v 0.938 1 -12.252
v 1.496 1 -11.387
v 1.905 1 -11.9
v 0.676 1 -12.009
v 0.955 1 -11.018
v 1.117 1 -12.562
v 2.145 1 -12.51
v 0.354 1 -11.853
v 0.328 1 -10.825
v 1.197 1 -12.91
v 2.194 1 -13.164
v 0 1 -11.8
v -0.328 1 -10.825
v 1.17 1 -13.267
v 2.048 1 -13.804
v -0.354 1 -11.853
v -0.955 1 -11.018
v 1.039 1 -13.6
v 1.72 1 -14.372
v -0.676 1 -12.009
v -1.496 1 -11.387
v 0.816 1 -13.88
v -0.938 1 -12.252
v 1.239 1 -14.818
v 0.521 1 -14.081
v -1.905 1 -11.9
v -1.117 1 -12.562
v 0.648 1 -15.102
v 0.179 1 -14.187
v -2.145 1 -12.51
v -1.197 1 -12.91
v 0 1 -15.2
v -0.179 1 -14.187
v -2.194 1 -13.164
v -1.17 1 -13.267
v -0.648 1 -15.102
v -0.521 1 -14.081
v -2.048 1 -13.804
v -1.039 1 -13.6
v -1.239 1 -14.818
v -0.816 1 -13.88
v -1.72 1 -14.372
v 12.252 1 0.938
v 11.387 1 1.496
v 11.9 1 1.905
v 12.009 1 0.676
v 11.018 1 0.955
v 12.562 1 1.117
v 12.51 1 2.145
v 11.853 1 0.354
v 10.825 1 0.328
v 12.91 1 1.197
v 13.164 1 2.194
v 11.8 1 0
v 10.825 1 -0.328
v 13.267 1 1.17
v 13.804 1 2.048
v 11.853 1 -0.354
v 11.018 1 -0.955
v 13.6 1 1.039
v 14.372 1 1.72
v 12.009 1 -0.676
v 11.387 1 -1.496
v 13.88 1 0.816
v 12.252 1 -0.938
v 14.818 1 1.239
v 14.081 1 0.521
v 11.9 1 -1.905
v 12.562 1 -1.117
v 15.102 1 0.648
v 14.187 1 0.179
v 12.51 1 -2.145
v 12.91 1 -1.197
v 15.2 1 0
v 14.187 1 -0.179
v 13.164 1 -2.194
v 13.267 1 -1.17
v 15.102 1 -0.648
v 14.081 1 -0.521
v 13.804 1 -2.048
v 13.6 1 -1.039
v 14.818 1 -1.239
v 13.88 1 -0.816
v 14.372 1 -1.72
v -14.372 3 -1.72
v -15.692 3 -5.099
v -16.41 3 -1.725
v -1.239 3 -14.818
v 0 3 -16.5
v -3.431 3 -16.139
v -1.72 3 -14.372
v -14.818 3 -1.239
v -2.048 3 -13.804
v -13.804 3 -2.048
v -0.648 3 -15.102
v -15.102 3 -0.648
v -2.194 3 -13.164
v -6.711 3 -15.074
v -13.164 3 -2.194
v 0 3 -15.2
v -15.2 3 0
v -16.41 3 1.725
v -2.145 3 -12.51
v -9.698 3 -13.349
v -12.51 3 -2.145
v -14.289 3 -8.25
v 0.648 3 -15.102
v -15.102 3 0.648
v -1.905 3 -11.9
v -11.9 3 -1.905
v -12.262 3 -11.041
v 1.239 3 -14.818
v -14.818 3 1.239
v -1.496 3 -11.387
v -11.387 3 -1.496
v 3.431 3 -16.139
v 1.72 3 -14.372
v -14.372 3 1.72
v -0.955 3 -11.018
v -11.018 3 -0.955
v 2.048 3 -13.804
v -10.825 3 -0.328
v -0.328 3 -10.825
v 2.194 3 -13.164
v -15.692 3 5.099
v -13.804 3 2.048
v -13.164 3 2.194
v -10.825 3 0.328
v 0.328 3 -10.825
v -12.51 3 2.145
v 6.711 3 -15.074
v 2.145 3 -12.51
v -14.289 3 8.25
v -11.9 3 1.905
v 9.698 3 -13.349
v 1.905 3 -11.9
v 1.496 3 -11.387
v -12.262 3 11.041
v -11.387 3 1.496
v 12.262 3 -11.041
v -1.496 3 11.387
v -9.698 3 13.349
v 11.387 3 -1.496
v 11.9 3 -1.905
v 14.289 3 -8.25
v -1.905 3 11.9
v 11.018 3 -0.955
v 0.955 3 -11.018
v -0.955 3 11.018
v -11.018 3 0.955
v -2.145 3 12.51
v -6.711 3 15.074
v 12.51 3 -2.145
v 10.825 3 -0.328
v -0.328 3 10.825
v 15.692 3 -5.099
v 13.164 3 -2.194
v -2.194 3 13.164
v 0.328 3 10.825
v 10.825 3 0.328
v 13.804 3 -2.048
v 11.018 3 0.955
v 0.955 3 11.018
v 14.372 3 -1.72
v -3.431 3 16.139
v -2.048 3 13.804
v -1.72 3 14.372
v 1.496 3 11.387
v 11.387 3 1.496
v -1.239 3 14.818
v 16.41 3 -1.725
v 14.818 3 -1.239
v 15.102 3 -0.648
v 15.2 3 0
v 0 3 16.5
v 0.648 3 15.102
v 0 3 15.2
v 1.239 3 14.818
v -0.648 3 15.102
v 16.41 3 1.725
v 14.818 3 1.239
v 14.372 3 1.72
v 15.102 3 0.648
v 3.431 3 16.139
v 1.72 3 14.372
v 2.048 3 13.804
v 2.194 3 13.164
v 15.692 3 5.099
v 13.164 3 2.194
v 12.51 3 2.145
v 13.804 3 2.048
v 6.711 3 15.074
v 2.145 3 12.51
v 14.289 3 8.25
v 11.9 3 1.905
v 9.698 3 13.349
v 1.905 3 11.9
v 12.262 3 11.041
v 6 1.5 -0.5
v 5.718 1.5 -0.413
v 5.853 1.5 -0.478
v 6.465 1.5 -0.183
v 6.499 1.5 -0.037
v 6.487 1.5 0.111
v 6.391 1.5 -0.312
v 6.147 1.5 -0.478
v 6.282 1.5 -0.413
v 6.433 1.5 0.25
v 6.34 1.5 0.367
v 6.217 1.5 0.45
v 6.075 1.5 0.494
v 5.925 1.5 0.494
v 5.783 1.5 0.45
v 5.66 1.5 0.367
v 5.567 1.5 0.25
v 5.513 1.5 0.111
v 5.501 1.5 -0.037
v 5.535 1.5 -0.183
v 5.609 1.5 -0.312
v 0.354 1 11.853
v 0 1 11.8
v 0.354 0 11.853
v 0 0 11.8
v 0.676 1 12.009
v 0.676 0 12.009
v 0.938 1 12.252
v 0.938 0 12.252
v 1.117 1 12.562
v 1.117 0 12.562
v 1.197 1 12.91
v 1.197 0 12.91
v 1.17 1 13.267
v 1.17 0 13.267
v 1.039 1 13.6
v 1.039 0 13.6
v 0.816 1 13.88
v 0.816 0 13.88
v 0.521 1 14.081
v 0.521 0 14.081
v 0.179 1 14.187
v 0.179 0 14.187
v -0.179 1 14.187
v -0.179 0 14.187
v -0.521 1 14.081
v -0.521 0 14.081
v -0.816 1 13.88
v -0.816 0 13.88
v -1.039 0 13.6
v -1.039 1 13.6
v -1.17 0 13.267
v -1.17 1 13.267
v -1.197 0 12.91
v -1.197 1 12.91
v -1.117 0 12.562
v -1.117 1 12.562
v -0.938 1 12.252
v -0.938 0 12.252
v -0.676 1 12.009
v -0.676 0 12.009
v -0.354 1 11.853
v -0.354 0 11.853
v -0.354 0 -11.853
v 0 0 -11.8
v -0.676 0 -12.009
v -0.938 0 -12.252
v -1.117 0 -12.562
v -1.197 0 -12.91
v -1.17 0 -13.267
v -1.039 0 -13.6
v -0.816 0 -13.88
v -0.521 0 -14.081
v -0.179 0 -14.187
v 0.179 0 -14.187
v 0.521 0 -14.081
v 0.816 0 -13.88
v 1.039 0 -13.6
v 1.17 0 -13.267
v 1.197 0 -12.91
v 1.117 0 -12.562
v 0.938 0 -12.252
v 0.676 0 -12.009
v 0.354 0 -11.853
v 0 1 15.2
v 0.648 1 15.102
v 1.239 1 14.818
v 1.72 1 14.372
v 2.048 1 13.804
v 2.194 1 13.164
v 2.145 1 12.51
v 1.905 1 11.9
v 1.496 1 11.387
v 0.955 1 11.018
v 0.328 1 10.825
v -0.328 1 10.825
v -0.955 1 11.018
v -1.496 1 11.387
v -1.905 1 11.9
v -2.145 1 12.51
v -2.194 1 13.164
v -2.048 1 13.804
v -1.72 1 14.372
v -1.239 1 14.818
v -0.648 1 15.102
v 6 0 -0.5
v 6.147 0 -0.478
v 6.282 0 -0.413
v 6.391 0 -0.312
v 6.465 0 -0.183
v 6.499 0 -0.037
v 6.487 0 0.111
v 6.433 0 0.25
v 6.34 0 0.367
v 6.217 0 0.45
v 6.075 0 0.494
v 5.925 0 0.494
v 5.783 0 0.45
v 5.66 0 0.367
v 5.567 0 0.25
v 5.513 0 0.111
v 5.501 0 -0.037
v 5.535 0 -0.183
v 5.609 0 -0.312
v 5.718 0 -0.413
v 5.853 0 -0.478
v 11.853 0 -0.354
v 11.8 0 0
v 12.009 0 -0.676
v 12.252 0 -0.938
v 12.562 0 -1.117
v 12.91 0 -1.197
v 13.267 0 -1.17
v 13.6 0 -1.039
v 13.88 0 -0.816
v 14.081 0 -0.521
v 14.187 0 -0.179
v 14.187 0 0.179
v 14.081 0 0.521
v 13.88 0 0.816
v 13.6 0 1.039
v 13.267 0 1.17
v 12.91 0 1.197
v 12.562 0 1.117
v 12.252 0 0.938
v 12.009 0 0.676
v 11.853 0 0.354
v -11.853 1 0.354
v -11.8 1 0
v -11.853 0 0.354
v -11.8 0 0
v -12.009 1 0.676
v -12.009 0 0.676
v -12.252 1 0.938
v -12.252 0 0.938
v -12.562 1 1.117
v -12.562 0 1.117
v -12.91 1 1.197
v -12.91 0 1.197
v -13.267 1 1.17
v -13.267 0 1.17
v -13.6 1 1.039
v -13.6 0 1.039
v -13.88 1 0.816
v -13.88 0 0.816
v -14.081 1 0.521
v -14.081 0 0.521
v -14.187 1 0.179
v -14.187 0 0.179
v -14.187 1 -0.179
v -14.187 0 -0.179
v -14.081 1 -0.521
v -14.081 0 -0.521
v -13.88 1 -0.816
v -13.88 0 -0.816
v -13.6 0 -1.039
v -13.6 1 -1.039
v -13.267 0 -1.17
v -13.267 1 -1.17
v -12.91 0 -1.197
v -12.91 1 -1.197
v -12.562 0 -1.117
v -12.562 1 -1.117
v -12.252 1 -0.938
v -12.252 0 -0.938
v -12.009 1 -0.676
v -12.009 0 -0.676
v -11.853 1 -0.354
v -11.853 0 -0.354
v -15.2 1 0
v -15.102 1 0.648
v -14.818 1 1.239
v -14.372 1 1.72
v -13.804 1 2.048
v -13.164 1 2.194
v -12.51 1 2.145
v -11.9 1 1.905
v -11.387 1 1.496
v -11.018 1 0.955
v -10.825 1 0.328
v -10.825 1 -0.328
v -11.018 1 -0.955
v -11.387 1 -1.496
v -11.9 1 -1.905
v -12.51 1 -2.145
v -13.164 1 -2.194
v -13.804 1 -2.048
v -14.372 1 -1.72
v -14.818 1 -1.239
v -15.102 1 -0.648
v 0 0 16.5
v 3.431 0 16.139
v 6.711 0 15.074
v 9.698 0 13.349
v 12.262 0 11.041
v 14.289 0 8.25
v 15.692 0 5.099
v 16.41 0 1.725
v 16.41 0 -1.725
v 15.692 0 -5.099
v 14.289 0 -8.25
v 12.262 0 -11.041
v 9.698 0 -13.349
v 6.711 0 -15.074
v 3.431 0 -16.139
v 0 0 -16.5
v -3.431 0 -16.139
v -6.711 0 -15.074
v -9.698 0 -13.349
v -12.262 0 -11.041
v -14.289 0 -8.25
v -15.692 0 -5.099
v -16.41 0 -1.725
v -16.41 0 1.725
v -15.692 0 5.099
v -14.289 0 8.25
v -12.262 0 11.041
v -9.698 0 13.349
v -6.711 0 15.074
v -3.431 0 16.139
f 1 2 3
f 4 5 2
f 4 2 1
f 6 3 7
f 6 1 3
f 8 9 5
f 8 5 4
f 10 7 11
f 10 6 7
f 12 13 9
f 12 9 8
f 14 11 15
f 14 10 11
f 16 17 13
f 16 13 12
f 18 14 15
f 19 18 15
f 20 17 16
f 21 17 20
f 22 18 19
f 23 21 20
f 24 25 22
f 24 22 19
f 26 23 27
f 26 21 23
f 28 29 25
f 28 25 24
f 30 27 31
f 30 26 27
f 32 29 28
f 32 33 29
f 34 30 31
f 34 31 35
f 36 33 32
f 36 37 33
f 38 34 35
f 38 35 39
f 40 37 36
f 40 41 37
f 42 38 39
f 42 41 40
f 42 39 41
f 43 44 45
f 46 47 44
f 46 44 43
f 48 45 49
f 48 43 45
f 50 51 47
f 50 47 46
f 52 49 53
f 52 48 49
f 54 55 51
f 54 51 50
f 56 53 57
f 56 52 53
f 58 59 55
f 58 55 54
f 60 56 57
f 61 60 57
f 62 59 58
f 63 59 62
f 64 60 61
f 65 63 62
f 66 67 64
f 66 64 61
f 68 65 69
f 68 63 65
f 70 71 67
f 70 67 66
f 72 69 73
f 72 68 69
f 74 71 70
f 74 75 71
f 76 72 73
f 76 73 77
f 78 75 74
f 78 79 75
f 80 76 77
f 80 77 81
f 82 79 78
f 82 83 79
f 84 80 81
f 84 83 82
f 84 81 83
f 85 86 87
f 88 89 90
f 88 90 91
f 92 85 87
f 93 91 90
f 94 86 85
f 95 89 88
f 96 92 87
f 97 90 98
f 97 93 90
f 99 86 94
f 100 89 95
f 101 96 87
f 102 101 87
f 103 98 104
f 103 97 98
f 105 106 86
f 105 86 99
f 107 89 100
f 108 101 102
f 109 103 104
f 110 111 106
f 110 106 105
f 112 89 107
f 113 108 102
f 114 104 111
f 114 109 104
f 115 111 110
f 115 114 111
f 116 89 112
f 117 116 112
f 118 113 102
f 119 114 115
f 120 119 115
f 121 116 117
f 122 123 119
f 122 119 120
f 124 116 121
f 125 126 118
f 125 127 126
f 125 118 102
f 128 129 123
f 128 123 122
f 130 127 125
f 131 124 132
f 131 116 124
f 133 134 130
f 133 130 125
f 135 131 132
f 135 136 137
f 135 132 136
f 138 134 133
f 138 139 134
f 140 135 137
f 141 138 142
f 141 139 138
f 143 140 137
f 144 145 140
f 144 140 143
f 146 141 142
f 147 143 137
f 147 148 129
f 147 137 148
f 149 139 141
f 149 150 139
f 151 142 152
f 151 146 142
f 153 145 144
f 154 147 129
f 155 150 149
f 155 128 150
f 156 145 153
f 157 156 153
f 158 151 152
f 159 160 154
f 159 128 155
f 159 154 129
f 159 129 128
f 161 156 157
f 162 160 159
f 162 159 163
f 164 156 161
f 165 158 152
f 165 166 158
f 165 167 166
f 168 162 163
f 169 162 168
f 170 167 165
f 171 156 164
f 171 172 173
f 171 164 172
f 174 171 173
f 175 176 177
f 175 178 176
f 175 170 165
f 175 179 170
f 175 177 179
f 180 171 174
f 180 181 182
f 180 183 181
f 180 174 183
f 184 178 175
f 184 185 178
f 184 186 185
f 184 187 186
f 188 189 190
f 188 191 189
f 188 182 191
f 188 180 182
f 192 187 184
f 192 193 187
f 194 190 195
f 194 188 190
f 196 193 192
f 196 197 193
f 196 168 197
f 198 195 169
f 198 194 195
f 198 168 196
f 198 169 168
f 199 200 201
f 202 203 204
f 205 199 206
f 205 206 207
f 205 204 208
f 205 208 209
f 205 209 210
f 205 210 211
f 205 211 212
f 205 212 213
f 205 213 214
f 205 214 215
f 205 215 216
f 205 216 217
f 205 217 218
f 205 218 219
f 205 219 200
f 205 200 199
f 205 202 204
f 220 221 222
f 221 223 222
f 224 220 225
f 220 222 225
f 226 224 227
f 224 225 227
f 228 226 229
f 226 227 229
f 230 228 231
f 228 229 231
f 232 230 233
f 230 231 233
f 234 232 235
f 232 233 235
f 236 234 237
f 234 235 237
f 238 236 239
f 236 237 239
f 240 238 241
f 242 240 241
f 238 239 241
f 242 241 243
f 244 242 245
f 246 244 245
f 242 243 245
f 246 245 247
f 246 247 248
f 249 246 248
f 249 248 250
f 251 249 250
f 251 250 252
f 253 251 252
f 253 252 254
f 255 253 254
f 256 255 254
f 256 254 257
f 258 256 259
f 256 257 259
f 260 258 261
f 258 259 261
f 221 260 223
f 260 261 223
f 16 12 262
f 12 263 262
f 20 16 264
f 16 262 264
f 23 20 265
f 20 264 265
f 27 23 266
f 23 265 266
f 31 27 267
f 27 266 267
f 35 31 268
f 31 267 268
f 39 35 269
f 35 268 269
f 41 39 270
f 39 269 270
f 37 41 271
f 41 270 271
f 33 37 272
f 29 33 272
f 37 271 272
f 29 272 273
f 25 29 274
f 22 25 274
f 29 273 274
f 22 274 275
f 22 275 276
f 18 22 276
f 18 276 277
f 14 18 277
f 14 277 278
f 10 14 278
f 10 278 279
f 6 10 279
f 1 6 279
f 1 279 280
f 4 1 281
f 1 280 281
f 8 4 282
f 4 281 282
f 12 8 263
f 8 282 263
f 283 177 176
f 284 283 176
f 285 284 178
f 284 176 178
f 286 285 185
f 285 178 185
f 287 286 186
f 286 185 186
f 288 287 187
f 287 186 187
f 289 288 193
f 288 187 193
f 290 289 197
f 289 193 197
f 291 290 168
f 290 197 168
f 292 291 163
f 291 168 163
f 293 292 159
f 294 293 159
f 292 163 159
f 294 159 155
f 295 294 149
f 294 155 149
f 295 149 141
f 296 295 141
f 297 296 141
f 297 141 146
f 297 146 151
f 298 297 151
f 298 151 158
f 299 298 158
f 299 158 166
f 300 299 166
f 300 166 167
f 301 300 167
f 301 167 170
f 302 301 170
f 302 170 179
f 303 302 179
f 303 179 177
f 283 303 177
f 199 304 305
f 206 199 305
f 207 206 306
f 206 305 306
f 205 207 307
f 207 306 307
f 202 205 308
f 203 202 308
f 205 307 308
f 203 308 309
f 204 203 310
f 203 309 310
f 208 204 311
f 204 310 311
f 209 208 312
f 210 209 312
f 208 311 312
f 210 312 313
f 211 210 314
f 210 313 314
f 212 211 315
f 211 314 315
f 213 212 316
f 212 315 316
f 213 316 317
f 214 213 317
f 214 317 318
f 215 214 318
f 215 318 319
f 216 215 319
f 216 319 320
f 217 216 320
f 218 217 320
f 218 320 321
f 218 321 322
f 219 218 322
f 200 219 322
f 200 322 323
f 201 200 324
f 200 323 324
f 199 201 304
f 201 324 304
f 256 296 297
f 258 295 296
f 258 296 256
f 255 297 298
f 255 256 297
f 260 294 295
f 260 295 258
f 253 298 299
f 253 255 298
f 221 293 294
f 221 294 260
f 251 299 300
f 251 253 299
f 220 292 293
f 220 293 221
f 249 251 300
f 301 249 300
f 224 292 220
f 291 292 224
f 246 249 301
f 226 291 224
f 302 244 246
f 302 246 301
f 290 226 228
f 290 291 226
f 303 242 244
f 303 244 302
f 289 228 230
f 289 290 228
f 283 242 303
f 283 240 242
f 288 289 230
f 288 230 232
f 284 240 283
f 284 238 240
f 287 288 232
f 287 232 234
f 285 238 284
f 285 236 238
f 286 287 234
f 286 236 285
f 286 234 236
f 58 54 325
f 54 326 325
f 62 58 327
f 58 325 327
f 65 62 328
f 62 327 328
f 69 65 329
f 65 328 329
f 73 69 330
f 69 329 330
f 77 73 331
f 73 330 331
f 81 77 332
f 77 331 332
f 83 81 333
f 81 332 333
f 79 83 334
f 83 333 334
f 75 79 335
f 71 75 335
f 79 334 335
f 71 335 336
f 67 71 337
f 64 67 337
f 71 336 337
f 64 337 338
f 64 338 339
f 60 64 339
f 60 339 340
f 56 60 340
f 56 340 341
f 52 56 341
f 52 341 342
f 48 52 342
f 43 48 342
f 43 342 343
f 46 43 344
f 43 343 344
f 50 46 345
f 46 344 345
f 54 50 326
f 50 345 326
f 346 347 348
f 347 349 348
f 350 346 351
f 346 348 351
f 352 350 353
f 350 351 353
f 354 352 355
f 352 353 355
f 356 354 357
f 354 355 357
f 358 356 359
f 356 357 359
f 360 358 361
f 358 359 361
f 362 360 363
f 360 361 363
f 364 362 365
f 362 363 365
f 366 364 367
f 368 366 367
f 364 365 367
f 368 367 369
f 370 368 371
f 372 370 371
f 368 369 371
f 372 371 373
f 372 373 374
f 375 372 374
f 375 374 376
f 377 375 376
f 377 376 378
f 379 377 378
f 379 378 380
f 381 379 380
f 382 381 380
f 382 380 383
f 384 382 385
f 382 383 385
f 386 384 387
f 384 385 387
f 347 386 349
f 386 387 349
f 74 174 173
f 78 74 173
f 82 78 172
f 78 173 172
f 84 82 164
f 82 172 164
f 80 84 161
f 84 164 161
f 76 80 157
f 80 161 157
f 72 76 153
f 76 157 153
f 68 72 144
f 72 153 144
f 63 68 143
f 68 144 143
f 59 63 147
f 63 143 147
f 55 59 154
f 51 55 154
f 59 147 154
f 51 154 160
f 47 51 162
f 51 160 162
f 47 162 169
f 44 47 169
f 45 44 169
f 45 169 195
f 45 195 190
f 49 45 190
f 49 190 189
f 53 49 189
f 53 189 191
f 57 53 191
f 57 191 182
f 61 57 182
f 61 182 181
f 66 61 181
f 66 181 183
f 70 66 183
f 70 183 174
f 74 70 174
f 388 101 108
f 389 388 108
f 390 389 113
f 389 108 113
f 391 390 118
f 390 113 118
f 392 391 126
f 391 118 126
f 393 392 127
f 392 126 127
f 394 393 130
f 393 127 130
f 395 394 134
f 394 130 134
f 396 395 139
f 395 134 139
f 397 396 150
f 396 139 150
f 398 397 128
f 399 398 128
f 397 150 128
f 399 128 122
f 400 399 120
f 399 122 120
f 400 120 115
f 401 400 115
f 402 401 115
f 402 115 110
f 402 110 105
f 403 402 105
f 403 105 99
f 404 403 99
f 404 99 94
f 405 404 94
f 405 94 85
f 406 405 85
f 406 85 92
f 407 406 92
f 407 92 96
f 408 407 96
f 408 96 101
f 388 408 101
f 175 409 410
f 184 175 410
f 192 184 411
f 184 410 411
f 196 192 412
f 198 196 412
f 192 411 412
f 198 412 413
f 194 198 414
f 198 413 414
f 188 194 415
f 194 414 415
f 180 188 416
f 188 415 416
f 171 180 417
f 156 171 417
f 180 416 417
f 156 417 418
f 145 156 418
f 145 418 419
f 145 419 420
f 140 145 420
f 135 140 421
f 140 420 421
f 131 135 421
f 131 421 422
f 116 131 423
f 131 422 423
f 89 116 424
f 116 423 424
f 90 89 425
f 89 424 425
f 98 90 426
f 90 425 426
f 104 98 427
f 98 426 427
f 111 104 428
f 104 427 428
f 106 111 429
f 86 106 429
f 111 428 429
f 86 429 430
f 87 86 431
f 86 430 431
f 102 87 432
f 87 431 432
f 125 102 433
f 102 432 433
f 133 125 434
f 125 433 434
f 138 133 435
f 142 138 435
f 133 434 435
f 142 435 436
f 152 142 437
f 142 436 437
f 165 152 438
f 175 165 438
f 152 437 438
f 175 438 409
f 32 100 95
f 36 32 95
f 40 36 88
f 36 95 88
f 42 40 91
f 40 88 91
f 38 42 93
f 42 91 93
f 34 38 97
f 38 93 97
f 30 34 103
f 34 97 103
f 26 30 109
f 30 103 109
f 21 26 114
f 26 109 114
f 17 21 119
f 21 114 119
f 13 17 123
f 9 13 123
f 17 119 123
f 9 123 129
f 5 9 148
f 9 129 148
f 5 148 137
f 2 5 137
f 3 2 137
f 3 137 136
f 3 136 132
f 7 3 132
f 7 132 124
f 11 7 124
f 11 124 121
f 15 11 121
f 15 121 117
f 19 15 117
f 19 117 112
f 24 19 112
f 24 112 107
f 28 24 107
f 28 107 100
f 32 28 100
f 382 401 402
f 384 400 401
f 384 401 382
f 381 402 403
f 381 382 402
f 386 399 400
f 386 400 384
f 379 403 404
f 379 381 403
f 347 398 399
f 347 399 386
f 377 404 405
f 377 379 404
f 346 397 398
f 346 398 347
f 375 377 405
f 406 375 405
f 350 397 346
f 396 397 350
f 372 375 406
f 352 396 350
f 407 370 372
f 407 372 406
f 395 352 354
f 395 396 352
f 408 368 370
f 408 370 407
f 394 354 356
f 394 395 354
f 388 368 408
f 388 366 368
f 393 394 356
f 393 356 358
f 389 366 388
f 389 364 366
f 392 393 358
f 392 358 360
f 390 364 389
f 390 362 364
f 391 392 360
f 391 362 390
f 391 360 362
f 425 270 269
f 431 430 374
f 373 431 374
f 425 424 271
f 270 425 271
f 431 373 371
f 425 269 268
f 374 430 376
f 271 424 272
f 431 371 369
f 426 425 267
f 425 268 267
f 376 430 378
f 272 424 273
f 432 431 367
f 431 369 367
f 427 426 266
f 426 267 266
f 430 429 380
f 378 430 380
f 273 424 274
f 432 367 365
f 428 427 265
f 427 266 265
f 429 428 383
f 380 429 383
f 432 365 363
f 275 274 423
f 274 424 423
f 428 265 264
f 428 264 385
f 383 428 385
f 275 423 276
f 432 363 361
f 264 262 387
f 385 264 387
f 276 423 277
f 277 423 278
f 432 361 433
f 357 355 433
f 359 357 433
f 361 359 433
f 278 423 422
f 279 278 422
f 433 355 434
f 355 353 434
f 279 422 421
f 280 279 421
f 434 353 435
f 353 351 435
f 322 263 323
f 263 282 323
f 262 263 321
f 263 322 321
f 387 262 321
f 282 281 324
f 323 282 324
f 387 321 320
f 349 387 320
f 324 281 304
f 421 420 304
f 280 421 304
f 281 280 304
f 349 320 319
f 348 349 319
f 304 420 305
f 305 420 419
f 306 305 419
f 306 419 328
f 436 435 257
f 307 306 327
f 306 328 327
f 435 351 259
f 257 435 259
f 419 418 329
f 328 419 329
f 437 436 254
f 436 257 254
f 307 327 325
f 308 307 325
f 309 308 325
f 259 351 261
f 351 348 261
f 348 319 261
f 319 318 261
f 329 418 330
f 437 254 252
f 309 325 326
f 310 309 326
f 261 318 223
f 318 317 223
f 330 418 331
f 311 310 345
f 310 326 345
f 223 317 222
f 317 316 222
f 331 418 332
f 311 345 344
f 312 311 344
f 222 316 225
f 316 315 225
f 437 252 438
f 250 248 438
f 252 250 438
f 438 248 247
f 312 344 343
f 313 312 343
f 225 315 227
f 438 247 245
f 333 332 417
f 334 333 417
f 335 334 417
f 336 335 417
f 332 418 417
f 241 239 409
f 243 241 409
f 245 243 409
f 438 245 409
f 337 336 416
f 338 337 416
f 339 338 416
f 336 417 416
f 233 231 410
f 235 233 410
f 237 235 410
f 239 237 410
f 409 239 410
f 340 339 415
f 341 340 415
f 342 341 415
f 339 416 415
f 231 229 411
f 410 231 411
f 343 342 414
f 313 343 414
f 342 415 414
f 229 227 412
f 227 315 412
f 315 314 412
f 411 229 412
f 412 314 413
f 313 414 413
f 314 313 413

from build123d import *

# Parameters (mm, degrees)
SKETCH1_R                      = 16.5
BOSS_EXTRUDE1_DEPTH            = 3
CBORE_FOR_M2_SHCS1_D           = 2.4
CBORE_FOR_M2_SHCS1_CBORE_D     = 4.4
CBORE_FOR_M2_SHCS1_CBORE_DEPTH = 2
CIRPATTERN1_COUNT              = 4
SKETCH8_R                      = 0.5
CUT_EXTRUDE1_DEPTH             = 1.5


with BuildPart() as part:
    # Sketch1 → Boss-Extrude1 (new body)
    with BuildSketch(Plane(origin=(0, 0, 0), x_dir=(1, 0, 0), z_dir=(0, 1, 0))):
        with Locations(Location((0, 0, 0), (0, 0, 270))):
            Circle(SKETCH1_R)
    extrude(amount=BOSS_EXTRUDE1_DEPTH)

    # CBORE for M2 SHCS1 (through all)
    with Locations(Plane(origin=(0, 3, 0), x_dir=(1, 0, 0), z_dir=(0, 1, 0))):
        with Locations((13, 0)):
            cbore_for_m2_shcs1 = CounterBoreHole(CBORE_FOR_M2_SHCS1_D / 2, CBORE_FOR_M2_SHCS1_CBORE_D / 2, CBORE_FOR_M2_SHCS1_CBORE_DEPTH)

    # CirPattern1: CBORE for M2 SHCS1 ×4 about axis
    cirpattern1_axis = Axis((0, 0, 0), (0, 1, 0))
    for i in range(1, CIRPATTERN1_COUNT):
        add(cbore_for_m2_shcs1.rotate(cirpattern1_axis, i * 360 / CIRPATTERN1_COUNT), mode=Mode.SUBTRACT)

    # Sketch8 → Cut-Extrude1 (cut)
    with BuildSketch(Plane.XZ):
        with Locations(Location((6, 0, 0), (0, 0, 270))):
            Circle(SKETCH8_R)
    extrude(amount=-CUT_EXTRUDE1_DEPTH, mode=Mode.SUBTRACT)


solid = part.part
